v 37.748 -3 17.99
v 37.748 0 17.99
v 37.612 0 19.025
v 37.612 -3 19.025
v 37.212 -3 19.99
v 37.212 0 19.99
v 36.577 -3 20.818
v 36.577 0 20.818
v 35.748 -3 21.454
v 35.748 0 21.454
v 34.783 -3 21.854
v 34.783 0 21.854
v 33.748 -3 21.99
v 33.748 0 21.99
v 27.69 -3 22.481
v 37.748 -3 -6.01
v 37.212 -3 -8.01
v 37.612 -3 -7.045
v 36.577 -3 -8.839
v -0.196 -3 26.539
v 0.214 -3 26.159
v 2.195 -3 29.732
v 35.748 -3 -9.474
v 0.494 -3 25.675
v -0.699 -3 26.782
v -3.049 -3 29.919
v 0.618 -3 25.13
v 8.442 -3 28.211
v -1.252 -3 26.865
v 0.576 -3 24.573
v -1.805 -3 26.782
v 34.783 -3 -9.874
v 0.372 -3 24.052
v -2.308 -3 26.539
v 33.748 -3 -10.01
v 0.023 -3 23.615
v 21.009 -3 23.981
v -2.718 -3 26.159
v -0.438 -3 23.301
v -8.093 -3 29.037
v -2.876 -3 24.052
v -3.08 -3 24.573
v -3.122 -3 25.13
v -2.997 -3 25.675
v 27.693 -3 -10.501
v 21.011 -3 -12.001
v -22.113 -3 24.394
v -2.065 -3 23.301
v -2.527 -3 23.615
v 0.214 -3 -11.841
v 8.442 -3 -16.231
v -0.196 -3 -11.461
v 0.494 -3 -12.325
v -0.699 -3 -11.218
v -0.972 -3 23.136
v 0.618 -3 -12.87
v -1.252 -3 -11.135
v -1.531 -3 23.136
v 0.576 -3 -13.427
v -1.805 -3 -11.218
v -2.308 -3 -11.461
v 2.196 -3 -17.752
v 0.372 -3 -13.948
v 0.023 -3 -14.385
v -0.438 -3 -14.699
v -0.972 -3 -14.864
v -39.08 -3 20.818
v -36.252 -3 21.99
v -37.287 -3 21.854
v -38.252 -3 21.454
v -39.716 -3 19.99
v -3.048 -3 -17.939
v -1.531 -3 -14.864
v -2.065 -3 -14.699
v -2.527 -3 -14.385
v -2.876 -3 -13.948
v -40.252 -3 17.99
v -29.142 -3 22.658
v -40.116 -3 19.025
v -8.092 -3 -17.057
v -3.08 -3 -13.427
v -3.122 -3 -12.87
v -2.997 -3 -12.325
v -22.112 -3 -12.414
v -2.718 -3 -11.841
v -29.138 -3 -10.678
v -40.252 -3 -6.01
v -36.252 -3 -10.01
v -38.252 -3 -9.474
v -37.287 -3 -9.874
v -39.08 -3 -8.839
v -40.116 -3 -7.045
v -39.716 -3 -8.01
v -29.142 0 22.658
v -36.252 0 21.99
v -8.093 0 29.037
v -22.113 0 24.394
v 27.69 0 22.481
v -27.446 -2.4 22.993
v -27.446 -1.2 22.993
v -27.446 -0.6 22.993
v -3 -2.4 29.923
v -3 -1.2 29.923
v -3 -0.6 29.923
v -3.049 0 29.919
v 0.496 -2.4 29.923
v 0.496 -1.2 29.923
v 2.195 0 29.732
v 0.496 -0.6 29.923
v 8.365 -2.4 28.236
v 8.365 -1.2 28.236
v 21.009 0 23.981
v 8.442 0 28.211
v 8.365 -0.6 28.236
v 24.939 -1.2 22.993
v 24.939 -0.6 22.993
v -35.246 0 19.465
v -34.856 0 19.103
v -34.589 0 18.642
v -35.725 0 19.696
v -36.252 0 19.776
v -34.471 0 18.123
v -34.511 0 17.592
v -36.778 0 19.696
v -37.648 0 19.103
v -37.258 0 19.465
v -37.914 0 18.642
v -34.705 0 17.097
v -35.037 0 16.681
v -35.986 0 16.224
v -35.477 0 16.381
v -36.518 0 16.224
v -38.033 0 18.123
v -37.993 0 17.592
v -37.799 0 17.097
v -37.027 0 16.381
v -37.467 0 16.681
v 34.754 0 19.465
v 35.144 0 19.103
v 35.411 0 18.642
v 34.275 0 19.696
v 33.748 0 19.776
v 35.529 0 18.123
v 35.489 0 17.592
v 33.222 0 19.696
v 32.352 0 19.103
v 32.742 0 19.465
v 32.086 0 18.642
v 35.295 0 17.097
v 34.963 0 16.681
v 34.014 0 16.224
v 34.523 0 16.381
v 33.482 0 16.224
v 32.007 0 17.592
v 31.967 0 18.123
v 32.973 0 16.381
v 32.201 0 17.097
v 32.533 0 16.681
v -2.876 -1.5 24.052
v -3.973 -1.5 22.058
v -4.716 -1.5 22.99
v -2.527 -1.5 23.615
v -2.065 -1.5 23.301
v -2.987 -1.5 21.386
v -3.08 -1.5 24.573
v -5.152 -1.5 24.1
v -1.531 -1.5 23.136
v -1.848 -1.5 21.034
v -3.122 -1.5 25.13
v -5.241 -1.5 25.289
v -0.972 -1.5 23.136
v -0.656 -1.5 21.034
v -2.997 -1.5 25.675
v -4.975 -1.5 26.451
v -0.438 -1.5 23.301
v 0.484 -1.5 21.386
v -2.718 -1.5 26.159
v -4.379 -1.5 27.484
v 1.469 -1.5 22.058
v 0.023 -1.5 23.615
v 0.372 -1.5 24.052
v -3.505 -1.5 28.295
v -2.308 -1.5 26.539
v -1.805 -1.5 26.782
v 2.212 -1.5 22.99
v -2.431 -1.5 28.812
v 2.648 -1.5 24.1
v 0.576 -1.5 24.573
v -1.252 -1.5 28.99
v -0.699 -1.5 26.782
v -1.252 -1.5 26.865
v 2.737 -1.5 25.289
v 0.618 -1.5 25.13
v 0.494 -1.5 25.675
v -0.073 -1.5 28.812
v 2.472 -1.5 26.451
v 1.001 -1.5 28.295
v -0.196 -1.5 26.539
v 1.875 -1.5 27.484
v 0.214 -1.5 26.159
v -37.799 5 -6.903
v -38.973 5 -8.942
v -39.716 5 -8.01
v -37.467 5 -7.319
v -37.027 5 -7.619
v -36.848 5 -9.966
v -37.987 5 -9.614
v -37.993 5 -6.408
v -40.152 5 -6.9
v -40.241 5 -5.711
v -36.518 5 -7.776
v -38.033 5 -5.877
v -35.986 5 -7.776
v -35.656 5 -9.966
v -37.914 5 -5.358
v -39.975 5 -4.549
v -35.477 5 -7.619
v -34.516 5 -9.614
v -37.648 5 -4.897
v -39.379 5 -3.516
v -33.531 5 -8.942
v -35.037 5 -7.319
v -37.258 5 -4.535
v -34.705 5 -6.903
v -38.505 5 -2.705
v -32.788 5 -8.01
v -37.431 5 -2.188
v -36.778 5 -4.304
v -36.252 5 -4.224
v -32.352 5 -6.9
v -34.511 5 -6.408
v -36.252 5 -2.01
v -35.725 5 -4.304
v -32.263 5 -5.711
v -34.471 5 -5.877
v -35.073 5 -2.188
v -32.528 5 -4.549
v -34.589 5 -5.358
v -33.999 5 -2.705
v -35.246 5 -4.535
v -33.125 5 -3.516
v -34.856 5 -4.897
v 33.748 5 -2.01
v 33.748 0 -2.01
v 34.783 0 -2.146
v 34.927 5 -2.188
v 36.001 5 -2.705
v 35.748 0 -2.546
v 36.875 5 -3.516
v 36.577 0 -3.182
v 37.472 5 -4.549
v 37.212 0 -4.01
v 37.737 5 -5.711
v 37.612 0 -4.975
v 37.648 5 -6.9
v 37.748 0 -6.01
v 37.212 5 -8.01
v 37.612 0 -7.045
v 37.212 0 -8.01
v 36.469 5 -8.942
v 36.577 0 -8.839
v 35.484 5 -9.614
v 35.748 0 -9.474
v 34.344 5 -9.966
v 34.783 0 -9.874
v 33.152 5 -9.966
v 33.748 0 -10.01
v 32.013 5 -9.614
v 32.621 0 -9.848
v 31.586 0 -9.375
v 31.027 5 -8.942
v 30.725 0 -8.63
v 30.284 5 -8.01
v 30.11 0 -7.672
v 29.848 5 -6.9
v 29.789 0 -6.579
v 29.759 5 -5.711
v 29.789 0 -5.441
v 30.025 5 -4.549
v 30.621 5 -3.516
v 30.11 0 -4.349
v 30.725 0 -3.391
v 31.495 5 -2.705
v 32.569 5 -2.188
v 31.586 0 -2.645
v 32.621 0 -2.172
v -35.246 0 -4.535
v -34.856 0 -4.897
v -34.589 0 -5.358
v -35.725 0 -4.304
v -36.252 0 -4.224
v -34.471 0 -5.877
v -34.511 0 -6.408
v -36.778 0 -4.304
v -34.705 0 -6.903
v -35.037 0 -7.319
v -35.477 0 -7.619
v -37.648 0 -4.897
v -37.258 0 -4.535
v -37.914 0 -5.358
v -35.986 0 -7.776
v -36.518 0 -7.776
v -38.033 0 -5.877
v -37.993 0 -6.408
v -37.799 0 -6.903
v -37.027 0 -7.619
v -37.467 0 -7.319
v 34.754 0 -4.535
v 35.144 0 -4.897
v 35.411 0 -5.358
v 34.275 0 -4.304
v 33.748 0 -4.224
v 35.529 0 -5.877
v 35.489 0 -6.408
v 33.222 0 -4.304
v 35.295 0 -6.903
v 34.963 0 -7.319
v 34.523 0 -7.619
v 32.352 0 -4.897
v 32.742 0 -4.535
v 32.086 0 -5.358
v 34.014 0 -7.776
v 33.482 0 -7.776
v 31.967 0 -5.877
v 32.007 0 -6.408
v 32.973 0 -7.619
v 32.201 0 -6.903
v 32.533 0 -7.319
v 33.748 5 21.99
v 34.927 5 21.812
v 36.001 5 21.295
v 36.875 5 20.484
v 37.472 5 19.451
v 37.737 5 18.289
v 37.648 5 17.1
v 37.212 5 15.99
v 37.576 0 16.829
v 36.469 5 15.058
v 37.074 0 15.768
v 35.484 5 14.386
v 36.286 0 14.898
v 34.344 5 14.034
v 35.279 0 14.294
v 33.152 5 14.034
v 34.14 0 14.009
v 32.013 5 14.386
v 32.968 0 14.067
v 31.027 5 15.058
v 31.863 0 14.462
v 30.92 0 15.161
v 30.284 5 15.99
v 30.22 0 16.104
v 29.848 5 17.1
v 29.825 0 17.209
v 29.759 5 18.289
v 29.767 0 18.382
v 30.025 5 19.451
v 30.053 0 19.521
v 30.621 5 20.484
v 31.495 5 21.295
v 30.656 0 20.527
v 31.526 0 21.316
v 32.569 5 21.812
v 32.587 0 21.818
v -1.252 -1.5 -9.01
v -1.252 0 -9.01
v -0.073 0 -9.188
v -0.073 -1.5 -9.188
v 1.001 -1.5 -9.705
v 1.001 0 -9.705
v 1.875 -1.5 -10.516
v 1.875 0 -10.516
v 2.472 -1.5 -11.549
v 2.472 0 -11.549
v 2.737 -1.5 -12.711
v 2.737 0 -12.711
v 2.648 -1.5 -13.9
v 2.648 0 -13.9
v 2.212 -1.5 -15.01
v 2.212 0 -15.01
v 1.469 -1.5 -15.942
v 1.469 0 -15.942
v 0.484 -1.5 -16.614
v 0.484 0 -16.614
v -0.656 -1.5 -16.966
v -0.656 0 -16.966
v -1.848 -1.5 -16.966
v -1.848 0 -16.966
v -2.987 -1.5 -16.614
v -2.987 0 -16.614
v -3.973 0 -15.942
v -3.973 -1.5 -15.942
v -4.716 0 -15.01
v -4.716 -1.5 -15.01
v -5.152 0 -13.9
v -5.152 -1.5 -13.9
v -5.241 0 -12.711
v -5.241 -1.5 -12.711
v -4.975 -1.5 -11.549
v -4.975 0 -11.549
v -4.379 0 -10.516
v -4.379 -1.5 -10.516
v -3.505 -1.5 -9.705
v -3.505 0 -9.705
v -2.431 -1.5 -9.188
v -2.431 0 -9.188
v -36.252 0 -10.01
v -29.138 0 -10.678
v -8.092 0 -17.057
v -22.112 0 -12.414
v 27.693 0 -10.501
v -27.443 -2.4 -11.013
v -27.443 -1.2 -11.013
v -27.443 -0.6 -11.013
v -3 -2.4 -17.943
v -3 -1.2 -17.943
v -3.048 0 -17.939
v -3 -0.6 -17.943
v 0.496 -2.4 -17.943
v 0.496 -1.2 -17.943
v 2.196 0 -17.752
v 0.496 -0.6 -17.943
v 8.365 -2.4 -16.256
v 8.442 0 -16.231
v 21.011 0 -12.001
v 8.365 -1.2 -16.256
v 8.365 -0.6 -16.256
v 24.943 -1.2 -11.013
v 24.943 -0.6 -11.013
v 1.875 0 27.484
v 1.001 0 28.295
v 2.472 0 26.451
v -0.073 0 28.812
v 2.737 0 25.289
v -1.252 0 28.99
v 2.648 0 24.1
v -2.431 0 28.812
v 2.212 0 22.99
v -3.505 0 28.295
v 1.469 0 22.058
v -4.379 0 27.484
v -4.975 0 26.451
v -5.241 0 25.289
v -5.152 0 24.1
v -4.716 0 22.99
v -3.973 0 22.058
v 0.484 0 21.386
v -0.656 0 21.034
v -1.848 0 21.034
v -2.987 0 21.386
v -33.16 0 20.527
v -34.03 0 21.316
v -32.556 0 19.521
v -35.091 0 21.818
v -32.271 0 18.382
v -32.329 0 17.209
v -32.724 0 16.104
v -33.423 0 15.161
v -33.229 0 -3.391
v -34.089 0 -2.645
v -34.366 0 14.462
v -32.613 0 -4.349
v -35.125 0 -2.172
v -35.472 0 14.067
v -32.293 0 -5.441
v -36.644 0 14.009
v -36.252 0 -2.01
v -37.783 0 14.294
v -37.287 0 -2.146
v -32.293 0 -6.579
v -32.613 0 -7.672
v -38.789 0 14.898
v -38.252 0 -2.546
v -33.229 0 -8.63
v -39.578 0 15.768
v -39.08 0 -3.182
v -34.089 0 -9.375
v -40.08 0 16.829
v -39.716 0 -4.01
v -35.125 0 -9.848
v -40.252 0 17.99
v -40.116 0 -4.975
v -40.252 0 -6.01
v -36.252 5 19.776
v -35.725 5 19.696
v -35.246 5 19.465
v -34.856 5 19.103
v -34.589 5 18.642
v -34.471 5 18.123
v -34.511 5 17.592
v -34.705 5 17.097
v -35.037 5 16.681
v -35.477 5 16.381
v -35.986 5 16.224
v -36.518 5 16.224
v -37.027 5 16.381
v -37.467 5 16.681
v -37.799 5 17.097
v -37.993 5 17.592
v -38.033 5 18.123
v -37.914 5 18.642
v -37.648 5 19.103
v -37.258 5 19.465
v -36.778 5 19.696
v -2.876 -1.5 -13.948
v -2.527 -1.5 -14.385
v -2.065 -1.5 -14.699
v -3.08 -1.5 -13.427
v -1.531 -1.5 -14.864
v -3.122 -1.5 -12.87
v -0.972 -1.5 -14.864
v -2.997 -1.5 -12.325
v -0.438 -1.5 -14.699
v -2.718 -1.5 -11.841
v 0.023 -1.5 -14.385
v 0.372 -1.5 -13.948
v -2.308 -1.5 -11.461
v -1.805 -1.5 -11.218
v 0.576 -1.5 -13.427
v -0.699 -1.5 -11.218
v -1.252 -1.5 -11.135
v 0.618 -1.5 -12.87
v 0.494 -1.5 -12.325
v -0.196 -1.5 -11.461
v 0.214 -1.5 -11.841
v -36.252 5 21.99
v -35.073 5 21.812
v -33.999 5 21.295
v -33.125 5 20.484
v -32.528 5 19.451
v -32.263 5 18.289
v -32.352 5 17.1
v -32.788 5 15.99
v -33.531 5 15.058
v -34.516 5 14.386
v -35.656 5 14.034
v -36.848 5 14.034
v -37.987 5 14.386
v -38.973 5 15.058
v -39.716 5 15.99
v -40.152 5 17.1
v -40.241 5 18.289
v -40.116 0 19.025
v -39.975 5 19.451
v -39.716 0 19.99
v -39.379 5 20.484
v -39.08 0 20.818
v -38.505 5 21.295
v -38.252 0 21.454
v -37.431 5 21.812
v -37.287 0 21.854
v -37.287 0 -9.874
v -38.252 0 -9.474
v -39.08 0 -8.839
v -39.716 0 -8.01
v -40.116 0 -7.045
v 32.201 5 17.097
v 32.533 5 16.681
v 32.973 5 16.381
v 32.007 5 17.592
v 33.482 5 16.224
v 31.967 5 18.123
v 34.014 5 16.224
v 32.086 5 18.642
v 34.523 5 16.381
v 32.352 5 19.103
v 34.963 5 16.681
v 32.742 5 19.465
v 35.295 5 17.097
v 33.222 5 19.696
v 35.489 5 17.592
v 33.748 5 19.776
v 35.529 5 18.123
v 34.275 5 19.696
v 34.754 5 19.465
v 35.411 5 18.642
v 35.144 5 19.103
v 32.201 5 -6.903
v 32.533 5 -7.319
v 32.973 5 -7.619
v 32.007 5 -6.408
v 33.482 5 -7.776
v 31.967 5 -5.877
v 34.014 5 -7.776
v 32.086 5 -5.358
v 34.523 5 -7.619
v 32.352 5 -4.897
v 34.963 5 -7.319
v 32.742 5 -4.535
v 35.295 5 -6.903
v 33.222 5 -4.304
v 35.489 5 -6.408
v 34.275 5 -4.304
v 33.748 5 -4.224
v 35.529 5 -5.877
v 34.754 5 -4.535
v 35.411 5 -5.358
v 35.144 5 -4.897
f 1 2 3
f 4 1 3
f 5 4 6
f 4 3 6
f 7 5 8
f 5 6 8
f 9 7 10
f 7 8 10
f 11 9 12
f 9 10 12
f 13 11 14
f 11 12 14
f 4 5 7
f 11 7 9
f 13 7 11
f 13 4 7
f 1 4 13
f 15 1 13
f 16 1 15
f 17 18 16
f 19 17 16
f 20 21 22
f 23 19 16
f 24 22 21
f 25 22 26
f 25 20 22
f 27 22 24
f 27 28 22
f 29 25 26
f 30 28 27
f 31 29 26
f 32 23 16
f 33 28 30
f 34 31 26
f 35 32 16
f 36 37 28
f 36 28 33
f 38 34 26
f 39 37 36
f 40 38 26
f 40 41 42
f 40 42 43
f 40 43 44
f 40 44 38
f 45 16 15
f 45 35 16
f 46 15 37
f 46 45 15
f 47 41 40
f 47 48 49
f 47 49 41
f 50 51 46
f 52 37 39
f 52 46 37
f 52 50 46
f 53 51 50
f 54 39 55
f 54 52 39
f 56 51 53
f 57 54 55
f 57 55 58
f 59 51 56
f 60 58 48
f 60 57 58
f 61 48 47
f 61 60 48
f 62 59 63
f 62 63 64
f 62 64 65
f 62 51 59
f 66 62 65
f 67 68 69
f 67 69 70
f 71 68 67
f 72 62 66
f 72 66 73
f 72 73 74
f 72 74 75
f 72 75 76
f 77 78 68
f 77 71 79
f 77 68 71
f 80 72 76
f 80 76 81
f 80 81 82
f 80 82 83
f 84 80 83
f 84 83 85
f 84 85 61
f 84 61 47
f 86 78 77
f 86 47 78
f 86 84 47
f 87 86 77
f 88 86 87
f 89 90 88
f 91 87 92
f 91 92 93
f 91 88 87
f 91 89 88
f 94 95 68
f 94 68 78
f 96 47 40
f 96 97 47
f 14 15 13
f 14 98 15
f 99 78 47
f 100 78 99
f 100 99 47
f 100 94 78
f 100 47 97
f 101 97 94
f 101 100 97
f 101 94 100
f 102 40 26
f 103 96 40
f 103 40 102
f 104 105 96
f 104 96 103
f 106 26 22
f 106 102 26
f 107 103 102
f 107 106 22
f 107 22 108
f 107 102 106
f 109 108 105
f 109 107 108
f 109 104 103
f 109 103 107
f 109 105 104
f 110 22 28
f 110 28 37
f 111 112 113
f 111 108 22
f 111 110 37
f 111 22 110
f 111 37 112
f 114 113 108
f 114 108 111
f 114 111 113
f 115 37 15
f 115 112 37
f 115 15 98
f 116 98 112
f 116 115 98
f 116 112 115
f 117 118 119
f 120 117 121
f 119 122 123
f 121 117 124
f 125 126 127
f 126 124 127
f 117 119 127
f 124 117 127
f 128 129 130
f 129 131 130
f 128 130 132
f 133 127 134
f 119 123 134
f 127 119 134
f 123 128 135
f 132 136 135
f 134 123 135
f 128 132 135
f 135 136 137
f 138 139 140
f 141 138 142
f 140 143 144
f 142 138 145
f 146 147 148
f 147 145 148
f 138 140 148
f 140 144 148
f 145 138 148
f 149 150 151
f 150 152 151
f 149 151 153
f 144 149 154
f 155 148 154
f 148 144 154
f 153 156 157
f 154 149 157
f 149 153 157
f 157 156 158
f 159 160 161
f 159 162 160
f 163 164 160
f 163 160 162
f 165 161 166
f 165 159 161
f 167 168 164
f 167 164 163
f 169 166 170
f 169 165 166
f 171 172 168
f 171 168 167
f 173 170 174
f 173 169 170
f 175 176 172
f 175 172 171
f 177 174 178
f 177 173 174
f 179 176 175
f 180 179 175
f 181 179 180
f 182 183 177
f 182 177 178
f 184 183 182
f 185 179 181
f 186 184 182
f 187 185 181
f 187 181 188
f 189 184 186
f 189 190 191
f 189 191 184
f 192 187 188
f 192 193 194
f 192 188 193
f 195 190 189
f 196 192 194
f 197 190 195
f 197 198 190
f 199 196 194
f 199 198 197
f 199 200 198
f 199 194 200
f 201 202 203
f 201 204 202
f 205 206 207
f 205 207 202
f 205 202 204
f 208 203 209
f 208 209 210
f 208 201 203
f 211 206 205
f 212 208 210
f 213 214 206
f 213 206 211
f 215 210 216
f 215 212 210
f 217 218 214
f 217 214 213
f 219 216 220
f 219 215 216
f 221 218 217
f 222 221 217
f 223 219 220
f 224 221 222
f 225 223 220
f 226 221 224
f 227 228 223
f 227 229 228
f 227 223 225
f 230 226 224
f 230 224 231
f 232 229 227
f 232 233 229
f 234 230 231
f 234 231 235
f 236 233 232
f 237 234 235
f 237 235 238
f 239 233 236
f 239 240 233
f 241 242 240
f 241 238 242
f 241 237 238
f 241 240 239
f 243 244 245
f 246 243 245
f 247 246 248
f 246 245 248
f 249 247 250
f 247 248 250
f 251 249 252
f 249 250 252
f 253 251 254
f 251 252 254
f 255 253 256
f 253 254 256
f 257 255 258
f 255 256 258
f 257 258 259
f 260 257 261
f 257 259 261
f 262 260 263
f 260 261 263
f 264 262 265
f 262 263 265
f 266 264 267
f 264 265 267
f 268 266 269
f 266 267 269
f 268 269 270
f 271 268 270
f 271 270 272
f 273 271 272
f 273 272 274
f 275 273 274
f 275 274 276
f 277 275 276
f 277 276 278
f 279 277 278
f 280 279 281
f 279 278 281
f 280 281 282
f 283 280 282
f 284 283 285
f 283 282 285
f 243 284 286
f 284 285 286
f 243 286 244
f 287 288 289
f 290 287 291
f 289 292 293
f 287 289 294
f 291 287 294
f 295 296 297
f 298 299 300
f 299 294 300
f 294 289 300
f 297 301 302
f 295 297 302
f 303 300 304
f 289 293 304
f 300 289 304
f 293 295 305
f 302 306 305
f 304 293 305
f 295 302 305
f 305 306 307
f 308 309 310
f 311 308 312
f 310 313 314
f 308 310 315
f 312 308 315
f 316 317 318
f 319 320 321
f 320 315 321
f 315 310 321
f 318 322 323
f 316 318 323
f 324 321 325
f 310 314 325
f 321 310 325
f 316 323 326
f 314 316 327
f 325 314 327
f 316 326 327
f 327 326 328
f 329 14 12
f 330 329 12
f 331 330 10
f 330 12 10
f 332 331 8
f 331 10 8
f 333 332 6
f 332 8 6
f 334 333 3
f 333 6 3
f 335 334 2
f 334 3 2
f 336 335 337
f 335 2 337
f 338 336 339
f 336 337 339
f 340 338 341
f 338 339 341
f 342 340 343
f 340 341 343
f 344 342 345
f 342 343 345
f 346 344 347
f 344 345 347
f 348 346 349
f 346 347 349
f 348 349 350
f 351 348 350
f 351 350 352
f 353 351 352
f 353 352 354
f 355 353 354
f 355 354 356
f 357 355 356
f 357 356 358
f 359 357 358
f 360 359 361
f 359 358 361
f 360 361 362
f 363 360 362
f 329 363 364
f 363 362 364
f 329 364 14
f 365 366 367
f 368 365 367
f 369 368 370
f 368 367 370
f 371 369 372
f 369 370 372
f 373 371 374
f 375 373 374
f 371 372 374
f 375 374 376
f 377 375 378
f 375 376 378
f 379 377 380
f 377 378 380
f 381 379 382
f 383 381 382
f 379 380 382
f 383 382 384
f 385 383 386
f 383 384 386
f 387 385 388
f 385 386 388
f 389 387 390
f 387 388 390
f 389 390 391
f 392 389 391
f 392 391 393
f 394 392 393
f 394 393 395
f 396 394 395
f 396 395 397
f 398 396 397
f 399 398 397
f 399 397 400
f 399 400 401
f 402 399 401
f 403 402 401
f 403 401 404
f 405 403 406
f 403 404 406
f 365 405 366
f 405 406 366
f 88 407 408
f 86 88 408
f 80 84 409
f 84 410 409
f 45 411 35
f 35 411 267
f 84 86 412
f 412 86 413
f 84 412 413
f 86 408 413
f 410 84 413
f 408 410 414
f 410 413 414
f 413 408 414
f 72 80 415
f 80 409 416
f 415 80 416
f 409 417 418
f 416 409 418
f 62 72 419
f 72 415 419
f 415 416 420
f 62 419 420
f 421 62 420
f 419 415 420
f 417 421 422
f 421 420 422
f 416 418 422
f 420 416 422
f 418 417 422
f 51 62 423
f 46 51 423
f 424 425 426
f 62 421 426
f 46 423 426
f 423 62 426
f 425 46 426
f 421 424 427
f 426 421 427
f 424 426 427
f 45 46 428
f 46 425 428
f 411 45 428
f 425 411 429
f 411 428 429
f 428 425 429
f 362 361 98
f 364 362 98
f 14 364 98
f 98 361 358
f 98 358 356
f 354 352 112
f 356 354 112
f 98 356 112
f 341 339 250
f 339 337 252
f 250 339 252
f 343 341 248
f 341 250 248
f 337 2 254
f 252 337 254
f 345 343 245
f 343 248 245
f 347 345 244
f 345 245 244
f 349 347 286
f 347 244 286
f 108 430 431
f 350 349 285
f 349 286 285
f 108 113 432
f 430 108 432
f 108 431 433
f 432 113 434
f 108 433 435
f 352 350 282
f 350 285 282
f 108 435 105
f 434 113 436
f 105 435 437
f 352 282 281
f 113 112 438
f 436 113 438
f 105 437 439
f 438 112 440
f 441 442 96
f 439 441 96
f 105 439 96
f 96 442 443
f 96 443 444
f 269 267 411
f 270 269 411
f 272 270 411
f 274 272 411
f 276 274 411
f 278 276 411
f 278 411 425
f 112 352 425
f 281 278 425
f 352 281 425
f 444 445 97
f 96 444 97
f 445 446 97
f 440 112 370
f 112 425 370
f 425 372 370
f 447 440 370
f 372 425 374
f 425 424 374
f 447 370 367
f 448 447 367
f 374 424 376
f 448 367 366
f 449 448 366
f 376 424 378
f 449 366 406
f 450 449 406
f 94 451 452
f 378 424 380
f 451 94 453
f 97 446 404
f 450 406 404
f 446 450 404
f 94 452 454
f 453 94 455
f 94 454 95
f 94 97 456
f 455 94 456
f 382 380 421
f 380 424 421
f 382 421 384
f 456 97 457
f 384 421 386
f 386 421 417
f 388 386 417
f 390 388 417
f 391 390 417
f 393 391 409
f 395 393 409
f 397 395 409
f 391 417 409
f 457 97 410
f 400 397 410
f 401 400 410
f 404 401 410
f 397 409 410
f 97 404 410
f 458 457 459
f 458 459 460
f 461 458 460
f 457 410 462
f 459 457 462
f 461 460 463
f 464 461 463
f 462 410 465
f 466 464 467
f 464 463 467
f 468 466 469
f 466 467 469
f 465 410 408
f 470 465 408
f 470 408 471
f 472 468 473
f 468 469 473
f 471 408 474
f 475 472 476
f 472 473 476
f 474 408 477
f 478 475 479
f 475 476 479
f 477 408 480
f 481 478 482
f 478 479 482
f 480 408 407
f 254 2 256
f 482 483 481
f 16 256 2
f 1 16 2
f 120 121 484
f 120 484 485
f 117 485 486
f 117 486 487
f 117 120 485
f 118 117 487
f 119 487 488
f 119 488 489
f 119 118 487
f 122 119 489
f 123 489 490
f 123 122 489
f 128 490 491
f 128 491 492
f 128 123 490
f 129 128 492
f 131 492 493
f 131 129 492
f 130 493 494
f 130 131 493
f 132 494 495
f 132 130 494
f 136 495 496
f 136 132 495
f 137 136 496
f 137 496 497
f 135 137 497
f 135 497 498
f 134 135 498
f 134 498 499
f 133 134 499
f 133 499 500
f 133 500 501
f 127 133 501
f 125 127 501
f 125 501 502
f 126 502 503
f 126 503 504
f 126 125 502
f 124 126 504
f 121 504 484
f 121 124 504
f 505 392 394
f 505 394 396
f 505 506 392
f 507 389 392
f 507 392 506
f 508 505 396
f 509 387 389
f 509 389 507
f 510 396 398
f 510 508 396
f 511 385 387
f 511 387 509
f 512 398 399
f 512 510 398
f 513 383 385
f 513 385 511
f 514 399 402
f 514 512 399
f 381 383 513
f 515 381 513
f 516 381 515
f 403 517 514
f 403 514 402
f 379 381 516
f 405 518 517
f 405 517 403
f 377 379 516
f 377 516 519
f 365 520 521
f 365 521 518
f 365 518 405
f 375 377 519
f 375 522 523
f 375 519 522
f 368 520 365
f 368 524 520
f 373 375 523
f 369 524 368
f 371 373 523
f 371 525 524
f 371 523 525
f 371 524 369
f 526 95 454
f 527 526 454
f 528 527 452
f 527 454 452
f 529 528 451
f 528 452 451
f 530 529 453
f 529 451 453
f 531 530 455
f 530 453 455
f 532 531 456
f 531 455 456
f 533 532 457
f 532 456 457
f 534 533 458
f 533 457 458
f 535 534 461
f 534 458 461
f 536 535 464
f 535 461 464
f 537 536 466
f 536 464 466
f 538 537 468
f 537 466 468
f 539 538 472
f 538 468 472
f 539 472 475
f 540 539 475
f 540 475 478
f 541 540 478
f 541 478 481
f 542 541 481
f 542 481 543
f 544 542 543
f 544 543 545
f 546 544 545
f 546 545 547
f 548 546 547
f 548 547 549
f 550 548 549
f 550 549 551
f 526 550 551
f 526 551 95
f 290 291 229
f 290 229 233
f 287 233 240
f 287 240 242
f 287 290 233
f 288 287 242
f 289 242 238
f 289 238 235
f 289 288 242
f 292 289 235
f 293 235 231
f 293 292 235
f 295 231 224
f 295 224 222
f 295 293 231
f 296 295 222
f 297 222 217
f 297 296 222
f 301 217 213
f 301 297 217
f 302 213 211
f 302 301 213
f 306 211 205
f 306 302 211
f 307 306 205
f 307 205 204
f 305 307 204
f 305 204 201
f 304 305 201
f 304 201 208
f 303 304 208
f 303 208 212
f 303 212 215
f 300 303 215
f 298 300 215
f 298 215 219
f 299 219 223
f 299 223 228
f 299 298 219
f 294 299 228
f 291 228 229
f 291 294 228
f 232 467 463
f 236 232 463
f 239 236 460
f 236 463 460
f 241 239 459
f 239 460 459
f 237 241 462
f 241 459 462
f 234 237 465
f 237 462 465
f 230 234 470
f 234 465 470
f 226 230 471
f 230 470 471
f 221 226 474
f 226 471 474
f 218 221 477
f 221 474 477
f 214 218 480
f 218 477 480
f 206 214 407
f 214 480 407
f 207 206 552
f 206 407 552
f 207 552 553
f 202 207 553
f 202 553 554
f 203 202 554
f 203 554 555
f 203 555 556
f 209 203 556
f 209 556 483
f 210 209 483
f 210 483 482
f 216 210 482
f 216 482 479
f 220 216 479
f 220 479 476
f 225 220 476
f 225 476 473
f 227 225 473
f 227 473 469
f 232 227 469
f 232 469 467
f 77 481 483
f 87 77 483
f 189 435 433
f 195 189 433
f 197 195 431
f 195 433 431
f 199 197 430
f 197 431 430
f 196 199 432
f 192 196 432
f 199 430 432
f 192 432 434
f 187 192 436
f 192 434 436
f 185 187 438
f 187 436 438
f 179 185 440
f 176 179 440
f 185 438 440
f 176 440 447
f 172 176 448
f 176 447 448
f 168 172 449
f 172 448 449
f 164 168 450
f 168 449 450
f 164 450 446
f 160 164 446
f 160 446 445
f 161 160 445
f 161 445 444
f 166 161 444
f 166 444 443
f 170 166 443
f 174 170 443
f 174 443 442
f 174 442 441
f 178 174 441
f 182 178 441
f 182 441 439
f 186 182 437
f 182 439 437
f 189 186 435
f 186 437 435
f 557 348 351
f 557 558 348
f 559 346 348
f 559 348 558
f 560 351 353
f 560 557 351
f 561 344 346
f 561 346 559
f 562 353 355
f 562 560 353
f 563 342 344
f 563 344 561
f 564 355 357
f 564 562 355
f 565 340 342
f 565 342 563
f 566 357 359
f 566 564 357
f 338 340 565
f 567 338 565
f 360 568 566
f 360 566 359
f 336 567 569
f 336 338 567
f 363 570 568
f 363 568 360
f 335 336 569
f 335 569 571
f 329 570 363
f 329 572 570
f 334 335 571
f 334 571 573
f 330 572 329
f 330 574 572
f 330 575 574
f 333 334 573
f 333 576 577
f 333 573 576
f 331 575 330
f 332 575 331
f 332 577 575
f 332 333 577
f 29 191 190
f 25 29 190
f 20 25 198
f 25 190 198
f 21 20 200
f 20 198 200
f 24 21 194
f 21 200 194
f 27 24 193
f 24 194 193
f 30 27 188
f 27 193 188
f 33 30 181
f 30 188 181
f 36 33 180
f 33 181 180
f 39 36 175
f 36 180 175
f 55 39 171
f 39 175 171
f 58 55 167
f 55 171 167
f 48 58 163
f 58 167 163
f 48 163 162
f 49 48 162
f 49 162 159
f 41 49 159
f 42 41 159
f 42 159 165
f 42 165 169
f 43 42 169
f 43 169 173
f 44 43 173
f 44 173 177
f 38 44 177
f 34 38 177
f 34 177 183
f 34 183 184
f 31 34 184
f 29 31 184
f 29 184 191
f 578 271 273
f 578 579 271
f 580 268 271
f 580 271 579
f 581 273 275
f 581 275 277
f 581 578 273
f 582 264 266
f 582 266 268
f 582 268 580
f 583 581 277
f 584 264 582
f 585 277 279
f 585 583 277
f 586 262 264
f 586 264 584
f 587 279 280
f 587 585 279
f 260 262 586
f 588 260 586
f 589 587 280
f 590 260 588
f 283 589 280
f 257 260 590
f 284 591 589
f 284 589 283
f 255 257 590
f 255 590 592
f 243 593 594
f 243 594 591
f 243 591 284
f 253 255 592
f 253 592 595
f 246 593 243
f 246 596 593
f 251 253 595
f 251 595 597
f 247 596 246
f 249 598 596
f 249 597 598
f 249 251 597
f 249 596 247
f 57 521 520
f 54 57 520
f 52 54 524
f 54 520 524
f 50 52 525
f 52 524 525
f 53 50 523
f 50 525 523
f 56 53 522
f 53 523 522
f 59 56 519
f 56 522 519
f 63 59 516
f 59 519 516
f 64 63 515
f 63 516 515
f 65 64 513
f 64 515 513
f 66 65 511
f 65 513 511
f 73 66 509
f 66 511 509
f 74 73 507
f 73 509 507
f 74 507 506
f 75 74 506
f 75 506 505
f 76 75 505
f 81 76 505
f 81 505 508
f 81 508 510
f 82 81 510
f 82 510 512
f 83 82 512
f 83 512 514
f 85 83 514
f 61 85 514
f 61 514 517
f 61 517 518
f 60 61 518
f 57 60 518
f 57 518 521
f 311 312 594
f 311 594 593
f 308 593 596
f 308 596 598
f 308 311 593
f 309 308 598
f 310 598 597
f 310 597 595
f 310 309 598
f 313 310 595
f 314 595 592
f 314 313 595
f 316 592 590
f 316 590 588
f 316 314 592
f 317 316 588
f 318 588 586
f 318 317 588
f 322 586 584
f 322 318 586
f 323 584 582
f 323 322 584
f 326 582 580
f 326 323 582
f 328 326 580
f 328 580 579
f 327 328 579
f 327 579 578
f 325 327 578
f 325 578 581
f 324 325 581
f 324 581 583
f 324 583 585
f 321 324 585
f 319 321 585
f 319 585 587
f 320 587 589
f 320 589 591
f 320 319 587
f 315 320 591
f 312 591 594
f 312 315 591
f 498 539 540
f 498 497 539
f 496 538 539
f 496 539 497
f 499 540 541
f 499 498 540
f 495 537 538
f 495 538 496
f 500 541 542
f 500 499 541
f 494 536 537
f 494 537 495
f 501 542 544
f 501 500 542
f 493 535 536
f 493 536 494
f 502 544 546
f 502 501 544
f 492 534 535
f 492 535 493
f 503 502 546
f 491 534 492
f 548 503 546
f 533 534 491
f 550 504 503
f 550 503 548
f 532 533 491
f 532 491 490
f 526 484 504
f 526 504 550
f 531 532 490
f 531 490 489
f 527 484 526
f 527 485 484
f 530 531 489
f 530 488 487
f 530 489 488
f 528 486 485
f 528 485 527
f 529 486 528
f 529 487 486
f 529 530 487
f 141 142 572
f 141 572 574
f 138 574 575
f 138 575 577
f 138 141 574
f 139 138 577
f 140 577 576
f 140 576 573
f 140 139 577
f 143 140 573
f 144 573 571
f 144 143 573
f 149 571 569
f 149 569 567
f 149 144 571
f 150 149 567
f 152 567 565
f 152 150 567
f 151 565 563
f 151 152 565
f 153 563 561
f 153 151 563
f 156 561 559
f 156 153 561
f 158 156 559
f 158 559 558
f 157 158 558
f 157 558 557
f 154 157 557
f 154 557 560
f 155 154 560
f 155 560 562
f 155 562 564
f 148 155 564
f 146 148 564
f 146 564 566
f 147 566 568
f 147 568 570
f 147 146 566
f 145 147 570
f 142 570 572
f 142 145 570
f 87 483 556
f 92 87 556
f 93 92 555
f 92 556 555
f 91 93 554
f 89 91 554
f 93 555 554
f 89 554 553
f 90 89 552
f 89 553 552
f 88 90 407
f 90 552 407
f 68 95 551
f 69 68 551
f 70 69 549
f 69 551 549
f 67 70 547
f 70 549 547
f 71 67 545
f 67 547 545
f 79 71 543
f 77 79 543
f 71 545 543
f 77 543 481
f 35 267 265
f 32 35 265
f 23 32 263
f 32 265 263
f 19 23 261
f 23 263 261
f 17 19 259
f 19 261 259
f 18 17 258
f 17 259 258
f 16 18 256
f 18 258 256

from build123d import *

# Parameters (mm, degrees)
BOSS_EXTRUDE3_DEPTH = 3
SKETCH13_R          = 4
SKETCH13_R_2        = 1.7859375
BOSS_EXTRUDE4_DEPTH = 5
SKETCH14_R          = 4
CUT_EXTRUDE8_DEPTH  = 1.5
SKETCH15_R          = 1.875
CUT_EXTRUDE9_DEPTH  = 4.0000001


with BuildPart() as part:
    # Sketch11 → Boss-Extrude3 (new body)
    with BuildSketch(Plane(origin=(0, 0, 0), x_dir=(1, 0, 0), z_dir=(0, 1, 0))):
        with BuildLine():
            Line((37.748131547, 6.010178191), (37.748131547, -17.989821809))
            ThreePointArc((37.748131547, -17.989821809), (36.576558672, -20.818248934), (33.748131547, -21.989821809))
            add(Edge.make_bspline(
                [(-36.251868453, -21.989821809), (-30.327598806, -21.989821809), (-19.243874055, -24.873158899), (-7.077839403, -30.012200103), (4.574088551, -30.012200103), (16.743326023, -24.873158899), (27.816510145, -21.989821809), (33.748131547, -21.989821809)],
                knots=[0, 0, 0, 0, 0.248449553, 0.474844955, 0.525155045, 0.751550447, 1, 1, 1, 1], degree=3))
            ThreePointArc((-36.251868453, -21.989821809), (-39.080295577, -20.818248934), (-40.251868453, -17.989821809))
            Line((-40.251868453, -17.989821809), (-40.251868453, 6.010178191))
            ThreePointArc((-40.251868453, 6.010178191), (-39.080295577, 8.838605316), (-36.251868453, 10.010178191))
            add(Edge.make_bspline(
                [(-36.251868453, 10.010178191), (-30.320247051, 10.010178191), (-19.247062928, 12.893515281), (-7.077825456, 18.032556484), (4.574102497, 18.032556484), (16.74013715, 12.893515281), (27.8238619, 10.010178191), (33.748131547, 10.010178191)],
                knots=[0, 0, 0, 0, 0.248449553, 0.474844955, 0.525155045, 0.751550447, 1, 1, 1, 1], degree=3))
            ThreePointArc((33.748131547, 10.010178191), (36.576558672, 8.838605316), (37.748131547, 6.010178191))
        make_face()
    extrude(amount=-BOSS_EXTRUDE3_DEPTH)

    # Sketch13 → Boss-Extrude4 (add)
    with BuildSketch(Plane(origin=(0, 0, 0), x_dir=(1, 0, 0), z_dir=(0, 1, 0))):
        with Locations(Location((-36.251868453, -17.989821809, 0), (0, 0, 270))):  # turned: the seam where the file's is
            Circle(SKETCH13_R)
        with Locations(Location((-36.251868453, -17.989821809, 0), (0, 0, 270))):  # turned: the seam where the file's is
            Circle(SKETCH13_R_2, mode=Mode.SUBTRACT)
        with Locations(Location((-36.251868453, 6.010178191, 0), (0, 0, 270))):  # turned: the seam where the file's is
            Circle(SKETCH13_R)
        with Locations(Location((-36.251868453, 6.010178191, 0), (0, 0, 270))):  # turned: the seam where the file's is
            Circle(SKETCH13_R_2, mode=Mode.SUBTRACT)
        with Locations(Location((33.748131547, 6.010178191, 0), (0, 0, 270))):  # turned: the seam where the file's is
            Circle(SKETCH13_R)
        with Locations(Location((33.748131547, 6.010178191, 0), (0, 0, 270))):  # turned: the seam where the file's is
            Circle(SKETCH13_R_2, mode=Mode.SUBTRACT)
        with Locations(Location((33.748131547, -17.989821809, 0), (0, 0, 270))):  # turned: the seam where the file's is
            Circle(SKETCH13_R)
        with Locations(Location((33.748131547, -17.989821809, 0), (0, 0, 270))):  # turned: the seam where the file's is
            Circle(SKETCH13_R_2, mode=Mode.SUBTRACT)
    extrude(amount=BOSS_EXTRUDE4_DEPTH)

    # Sketch14 → Cut-Extrude8 (cut)
    with BuildSketch(Plane(origin=(0, 0, 0), x_dir=(1, 0, 0), z_dir=(0, 1, 0))):
        with Locations(Location((-1.251868453, 13.010178191, 0), (0, 0, 270))):  # turned: the seam where the file's is
            Circle(SKETCH14_R)
        with Locations(Location((-1.251868453, -24.989821809, 0), (0, 0, 270))):  # turned: the seam where the file's is
            Circle(SKETCH14_R)
    extrude(amount=-CUT_EXTRUDE8_DEPTH, mode=Mode.SUBTRACT)

    # Sketch15 → Cut-Extrude9 (cut, through all)
    with BuildSketch(Plane(origin=(0, 0, 0), x_dir=(1, 0, 0), z_dir=(0, 1, 0))):
        with Locations(Location((-1.251868453, -24.989821809, 0), (0, 0, 270))):  # turned: the seam where the file's is
            Circle(SKETCH15_R)
        with Locations(Location((-1.251868453, 13.010178191, 0), (0, 0, 270))):  # turned: the seam where the file's is
            Circle(SKETCH15_R)
    extrude(amount=-CUT_EXTRUDE9_DEPTH, mode=Mode.SUBTRACT)


solid = part.part
